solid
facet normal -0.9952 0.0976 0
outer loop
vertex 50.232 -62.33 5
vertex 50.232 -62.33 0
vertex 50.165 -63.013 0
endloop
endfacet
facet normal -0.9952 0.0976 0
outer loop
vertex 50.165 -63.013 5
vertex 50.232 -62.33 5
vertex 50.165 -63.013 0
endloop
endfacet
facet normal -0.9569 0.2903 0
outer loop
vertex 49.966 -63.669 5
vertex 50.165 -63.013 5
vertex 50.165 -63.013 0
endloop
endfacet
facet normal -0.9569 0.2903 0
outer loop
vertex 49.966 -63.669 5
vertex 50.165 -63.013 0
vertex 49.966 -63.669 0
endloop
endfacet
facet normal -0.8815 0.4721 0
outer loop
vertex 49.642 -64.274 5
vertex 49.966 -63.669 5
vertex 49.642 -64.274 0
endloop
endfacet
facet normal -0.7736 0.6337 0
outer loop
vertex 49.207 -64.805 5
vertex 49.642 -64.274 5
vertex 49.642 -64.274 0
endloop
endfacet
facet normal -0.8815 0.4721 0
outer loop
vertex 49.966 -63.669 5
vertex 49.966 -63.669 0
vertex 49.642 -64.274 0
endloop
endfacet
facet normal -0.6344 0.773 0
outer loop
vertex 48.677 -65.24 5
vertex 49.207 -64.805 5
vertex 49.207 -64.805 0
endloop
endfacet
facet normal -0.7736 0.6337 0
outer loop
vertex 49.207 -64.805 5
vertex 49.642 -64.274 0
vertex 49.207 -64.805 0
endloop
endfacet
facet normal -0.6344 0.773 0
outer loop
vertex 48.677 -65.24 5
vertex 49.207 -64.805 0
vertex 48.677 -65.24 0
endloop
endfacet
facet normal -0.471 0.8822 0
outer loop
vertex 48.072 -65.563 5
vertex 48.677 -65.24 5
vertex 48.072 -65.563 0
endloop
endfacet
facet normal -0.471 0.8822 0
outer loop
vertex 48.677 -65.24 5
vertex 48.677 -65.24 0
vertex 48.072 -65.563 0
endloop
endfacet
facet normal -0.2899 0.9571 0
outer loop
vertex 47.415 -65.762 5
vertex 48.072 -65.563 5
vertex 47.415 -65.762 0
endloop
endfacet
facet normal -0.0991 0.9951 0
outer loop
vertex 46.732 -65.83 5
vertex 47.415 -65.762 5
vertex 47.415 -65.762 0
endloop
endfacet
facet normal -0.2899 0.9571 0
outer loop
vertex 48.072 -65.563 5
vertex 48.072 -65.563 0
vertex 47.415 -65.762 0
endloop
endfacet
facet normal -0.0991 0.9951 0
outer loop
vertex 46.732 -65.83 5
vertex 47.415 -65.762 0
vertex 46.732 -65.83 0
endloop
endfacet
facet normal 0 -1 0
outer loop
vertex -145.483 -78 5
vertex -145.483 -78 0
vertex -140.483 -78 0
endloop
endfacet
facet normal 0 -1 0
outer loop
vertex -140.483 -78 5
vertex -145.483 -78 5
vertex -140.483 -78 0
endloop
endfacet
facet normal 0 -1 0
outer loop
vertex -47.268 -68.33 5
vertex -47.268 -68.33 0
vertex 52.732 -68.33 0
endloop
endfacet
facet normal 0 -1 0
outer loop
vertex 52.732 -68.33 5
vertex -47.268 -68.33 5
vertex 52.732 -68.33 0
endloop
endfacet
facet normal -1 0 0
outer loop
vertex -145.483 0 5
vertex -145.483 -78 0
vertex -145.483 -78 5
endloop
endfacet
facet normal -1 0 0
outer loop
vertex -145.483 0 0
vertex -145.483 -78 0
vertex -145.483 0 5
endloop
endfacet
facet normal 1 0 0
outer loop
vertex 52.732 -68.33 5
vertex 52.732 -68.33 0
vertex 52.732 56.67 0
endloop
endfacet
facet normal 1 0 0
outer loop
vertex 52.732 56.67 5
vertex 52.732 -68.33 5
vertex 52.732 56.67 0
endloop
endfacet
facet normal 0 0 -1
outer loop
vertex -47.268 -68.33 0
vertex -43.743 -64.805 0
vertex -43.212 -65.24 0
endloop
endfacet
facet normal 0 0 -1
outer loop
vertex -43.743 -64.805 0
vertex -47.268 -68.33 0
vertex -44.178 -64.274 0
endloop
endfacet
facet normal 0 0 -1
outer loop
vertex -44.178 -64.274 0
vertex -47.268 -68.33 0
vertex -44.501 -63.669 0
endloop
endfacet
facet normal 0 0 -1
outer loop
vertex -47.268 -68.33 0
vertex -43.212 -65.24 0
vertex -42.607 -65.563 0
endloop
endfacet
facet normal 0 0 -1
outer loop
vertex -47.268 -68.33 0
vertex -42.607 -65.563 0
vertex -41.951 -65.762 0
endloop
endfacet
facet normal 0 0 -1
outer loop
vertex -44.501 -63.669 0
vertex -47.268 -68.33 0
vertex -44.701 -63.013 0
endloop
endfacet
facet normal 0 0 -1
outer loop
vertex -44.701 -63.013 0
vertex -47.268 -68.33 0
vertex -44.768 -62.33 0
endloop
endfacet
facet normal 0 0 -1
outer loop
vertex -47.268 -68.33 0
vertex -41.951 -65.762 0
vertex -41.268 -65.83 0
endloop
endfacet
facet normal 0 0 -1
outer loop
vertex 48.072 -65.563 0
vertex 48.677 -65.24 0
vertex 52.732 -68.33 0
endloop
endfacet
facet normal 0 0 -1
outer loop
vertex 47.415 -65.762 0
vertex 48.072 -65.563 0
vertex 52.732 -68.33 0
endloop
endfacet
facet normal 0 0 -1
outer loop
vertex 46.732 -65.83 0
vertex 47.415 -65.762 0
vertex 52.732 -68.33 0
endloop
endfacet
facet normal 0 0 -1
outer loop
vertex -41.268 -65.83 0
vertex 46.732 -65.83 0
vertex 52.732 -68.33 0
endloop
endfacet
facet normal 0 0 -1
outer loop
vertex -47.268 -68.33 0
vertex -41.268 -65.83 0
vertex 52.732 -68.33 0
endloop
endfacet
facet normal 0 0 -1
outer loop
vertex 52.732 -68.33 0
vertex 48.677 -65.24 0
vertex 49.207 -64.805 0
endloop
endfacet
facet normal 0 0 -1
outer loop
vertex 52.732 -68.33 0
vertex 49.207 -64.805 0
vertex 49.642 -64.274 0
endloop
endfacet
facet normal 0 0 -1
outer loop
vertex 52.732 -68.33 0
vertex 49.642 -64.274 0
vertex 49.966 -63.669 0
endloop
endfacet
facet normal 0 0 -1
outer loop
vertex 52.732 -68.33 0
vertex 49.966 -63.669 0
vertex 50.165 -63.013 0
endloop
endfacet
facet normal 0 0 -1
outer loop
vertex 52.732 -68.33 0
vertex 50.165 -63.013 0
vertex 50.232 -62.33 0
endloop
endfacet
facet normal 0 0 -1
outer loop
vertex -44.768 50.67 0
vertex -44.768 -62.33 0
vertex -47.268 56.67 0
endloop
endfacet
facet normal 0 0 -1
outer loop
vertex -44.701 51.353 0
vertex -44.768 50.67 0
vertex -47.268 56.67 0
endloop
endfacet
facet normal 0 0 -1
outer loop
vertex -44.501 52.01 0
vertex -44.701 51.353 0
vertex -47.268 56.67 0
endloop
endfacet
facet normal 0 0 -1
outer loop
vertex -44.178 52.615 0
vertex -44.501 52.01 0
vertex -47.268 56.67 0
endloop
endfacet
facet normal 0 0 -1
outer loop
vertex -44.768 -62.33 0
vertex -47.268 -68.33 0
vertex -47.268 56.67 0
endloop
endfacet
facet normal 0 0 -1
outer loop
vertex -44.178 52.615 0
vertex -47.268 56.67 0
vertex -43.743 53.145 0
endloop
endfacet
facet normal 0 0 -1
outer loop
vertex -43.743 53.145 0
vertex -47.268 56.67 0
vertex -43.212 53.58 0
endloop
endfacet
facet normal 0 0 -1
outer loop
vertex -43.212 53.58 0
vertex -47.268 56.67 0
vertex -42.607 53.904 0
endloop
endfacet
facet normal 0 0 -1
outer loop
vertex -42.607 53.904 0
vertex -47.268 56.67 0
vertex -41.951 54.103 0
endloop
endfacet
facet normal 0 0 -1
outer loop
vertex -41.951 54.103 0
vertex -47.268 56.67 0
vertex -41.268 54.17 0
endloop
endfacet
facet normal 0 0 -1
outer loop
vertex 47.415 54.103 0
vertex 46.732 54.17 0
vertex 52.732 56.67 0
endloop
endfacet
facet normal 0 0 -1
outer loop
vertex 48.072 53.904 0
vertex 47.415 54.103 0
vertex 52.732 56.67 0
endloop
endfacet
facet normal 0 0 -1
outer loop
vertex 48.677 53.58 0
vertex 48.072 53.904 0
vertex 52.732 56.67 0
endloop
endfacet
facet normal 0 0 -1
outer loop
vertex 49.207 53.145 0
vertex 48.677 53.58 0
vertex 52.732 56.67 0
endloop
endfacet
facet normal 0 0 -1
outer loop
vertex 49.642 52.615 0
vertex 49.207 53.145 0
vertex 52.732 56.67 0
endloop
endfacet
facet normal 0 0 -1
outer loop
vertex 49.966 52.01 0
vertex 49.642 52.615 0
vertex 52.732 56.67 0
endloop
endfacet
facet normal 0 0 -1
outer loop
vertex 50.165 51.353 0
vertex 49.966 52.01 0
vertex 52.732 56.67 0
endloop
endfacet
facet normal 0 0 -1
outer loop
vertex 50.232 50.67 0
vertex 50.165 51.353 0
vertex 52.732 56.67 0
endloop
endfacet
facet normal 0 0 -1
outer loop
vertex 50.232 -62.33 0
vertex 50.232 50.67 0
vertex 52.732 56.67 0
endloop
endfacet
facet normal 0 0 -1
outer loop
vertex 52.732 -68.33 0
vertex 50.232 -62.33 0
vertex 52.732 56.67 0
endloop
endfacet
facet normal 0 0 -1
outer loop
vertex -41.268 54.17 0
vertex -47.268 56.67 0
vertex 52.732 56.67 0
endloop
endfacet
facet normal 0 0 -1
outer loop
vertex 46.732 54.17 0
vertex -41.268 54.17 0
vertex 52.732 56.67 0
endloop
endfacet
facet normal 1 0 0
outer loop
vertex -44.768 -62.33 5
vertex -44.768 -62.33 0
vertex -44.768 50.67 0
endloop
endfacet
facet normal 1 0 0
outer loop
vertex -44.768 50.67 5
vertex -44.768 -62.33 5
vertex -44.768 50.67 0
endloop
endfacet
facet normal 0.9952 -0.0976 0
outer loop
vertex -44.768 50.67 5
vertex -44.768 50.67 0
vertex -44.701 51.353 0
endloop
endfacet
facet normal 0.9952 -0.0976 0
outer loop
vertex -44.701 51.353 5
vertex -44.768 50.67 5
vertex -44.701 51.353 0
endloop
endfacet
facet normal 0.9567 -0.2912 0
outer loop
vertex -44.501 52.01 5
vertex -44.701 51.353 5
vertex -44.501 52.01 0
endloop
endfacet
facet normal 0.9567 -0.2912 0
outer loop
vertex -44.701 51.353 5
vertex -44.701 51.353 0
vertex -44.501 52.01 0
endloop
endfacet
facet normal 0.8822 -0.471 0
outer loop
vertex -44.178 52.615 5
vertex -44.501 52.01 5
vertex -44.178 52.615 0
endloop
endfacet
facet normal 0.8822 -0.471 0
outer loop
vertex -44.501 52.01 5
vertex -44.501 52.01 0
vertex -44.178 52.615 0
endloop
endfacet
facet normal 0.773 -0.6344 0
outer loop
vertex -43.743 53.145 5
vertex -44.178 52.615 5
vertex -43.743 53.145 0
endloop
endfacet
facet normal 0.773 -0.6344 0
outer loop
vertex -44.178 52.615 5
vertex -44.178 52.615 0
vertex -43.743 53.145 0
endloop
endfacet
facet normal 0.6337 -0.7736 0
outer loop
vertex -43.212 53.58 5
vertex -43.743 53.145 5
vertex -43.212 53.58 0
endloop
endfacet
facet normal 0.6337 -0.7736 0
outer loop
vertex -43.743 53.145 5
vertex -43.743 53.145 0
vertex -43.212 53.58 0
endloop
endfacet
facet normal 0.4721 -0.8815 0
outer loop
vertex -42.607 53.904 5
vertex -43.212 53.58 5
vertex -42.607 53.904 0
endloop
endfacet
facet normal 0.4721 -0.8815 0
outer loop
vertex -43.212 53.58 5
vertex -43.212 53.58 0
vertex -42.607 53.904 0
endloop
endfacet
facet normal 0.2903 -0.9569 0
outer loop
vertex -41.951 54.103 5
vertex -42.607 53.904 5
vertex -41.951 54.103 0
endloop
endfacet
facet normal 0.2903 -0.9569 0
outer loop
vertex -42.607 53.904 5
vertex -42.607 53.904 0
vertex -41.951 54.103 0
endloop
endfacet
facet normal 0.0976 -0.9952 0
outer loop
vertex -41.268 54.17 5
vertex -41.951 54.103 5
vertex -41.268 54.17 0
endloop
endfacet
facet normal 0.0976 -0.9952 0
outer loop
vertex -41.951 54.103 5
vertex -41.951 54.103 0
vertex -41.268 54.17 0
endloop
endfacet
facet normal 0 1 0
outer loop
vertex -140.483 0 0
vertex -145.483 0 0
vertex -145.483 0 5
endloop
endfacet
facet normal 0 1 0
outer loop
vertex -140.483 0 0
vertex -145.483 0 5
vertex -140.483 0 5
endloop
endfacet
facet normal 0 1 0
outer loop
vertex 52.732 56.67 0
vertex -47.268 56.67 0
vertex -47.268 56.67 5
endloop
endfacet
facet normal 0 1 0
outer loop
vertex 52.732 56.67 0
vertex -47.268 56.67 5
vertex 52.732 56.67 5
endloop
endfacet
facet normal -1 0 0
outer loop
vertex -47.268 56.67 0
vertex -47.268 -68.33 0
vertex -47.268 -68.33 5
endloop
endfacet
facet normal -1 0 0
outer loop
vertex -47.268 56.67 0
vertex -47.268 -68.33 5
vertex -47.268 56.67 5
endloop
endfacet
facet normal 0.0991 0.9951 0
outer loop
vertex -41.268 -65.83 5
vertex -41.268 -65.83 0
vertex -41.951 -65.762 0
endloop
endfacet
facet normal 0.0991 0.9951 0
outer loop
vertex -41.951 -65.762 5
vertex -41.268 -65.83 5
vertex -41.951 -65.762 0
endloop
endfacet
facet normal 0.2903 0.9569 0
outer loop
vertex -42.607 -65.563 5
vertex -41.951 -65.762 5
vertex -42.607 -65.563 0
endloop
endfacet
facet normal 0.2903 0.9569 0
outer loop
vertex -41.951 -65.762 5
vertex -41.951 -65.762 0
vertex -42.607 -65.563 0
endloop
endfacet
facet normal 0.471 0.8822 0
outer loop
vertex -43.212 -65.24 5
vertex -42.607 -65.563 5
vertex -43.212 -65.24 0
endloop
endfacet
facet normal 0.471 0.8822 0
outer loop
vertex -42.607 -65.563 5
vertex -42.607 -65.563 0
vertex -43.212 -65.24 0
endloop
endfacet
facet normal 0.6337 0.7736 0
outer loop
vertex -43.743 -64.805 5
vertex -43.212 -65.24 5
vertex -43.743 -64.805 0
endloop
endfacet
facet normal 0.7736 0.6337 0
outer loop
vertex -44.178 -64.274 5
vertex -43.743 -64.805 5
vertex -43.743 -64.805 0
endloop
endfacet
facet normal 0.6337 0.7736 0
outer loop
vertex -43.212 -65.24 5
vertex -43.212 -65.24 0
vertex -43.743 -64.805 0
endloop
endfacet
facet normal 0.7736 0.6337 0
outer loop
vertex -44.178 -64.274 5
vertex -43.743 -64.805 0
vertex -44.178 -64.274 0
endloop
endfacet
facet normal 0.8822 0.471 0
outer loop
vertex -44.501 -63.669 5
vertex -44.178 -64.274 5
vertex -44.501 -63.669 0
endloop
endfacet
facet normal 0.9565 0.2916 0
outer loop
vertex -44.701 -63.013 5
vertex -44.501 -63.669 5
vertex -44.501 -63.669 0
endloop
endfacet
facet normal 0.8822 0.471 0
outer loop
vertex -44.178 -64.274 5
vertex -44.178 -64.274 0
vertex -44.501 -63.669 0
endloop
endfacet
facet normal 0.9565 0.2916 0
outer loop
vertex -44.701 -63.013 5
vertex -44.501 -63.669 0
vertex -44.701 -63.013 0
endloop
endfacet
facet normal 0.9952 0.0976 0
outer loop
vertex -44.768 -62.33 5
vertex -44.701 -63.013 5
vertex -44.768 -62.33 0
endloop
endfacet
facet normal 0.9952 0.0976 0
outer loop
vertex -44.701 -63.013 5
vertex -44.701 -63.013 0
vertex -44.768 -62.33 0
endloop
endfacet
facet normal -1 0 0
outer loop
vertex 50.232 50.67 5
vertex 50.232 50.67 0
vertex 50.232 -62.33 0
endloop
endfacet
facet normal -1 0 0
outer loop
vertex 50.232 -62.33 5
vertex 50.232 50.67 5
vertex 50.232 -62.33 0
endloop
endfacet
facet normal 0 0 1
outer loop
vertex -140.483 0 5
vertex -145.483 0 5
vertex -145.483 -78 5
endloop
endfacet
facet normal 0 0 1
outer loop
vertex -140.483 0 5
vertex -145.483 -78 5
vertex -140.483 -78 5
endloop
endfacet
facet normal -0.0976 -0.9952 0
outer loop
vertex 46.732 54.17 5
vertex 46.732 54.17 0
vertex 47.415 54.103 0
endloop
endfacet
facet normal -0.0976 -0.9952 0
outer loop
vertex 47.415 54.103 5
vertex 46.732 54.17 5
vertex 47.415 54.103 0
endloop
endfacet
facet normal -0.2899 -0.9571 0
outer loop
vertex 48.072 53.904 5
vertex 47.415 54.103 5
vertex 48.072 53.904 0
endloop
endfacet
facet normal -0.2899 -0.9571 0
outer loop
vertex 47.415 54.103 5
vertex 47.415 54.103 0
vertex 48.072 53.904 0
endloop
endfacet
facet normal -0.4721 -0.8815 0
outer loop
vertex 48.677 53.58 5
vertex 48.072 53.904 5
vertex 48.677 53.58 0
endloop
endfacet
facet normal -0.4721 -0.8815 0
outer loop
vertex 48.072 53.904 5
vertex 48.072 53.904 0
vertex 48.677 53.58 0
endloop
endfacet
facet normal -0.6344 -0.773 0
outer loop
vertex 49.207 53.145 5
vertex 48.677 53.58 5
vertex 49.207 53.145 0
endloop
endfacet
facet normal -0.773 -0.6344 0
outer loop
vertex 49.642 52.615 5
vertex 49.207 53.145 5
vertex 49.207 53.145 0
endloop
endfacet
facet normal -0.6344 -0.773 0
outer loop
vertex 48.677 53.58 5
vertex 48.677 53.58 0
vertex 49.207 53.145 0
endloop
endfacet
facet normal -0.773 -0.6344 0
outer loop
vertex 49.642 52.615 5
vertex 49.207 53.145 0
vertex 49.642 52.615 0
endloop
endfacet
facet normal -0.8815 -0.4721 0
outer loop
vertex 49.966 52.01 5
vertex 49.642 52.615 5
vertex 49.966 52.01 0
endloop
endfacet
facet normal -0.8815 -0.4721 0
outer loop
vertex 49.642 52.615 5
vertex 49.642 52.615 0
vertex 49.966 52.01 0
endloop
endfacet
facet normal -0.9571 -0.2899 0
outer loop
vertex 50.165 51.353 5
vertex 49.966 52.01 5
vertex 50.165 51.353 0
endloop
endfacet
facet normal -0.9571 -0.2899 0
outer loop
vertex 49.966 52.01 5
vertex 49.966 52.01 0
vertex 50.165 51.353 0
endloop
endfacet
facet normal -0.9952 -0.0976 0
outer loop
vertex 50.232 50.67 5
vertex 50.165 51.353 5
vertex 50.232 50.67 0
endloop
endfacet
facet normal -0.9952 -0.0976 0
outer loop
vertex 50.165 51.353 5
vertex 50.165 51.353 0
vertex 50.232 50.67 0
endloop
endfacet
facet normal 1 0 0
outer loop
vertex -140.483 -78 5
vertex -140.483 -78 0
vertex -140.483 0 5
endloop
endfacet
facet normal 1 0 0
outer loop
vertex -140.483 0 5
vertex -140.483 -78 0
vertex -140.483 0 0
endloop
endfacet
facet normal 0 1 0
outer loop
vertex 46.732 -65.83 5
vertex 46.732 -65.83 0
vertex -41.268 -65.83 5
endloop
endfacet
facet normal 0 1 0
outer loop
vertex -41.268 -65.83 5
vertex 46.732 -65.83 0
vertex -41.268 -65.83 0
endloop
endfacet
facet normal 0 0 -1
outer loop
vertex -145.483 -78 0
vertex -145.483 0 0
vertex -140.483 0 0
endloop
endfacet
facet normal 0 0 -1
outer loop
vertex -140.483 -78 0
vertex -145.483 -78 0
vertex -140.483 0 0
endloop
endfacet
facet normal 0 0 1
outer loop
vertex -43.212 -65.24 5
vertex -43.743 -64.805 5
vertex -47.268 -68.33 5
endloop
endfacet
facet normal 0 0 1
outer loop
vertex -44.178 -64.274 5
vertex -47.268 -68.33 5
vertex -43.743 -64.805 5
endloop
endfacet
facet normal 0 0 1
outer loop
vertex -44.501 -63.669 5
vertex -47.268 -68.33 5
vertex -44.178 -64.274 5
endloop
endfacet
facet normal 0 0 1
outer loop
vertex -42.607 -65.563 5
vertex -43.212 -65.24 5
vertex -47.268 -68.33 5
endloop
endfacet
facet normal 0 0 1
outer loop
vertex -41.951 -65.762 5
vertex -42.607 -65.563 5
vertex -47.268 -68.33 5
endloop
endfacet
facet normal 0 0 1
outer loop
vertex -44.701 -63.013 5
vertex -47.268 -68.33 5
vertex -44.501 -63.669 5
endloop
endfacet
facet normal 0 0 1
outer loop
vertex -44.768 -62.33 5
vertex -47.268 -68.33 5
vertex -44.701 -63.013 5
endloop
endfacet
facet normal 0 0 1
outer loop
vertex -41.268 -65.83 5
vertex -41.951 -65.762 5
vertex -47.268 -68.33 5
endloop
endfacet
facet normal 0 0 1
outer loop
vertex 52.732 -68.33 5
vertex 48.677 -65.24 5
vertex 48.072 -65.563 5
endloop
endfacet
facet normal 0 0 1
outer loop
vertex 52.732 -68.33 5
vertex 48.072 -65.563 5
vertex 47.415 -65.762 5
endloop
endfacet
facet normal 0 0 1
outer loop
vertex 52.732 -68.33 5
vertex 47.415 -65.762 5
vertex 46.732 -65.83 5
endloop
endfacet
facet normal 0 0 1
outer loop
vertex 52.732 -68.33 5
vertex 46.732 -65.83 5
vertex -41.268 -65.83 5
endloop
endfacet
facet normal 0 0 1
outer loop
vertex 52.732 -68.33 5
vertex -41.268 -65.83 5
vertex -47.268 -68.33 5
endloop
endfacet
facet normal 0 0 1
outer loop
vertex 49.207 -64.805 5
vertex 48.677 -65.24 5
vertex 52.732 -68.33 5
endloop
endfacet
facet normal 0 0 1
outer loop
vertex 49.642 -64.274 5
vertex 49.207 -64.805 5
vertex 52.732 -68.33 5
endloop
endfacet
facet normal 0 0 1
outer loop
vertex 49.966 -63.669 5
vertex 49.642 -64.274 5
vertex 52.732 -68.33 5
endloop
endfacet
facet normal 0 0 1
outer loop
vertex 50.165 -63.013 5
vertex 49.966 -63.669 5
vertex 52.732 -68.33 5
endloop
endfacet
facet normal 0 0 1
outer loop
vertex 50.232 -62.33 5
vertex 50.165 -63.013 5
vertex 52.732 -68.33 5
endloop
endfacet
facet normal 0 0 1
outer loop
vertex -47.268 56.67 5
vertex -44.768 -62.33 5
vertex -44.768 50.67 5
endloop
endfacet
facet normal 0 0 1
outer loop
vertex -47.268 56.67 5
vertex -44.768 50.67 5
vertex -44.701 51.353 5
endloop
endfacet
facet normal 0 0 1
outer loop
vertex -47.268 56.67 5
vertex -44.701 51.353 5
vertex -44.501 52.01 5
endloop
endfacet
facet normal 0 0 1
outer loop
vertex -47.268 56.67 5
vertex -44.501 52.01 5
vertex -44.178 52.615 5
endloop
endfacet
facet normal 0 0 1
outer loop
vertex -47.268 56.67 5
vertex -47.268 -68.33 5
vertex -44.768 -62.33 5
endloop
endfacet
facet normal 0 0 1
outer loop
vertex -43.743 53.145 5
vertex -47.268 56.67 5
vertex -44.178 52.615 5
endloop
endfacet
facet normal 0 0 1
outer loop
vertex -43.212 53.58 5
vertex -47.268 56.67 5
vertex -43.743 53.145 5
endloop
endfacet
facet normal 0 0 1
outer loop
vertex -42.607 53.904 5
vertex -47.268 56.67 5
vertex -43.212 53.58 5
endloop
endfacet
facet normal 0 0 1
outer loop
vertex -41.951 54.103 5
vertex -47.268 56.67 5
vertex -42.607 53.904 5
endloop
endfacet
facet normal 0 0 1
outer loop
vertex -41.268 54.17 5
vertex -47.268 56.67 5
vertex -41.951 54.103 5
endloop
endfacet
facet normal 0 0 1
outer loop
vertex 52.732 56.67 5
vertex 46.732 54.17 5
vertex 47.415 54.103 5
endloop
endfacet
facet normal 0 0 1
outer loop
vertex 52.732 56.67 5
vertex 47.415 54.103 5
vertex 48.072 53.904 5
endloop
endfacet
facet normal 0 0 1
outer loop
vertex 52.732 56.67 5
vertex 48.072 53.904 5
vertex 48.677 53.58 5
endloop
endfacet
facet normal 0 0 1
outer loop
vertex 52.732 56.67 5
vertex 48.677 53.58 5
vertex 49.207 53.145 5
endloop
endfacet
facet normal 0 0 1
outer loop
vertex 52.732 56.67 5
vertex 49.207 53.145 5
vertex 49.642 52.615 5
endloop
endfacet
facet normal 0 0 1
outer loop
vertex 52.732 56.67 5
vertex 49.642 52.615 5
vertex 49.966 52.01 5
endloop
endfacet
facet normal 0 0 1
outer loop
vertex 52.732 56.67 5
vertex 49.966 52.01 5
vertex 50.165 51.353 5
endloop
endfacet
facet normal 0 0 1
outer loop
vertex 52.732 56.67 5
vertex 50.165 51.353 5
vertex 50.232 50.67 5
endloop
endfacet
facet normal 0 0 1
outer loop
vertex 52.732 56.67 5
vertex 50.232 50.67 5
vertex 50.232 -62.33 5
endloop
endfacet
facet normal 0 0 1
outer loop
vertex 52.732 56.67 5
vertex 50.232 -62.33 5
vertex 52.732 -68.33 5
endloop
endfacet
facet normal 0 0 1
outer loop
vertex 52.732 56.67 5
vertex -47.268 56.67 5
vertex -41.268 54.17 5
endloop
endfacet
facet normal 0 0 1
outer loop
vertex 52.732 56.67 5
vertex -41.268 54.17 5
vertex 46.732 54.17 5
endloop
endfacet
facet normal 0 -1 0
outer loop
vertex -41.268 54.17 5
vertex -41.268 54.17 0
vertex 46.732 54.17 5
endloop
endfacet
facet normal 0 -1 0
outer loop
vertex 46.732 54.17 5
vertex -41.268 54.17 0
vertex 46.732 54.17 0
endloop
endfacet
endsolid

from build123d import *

# Parameters (mm, degrees)
F0_W     = 100
F0_H     = 125
F1_DEPTH = 5
F0_W_2   = 5
F0_H_2   = 78


with BuildPart() as f1:
    # F0 (on Top) → F1 (new body)
    with BuildSketch(Plane.XY):
        with Locations((2.7321317747, -5.829744041)):
            Rectangle(F0_W, F0_H)
        with BuildLine():
            ThreePointArc((-44.7678682253, 50.670255959), (-43.7427419594, 53.1451296932), (-41.2678682253, 54.170255959))
            Line((-41.2678682253, 54.170255959), (46.7321317747, 54.170255959))
            ThreePointArc((46.7321317747, 54.170255959), (49.2070055089, 53.1451296932), (50.2321317747, 50.670255959))
            Line((50.2321317747, 50.670255959), (50.2321317747, -62.329744041))
            ThreePointArc((50.2321317747, -62.329744041), (49.2070055089, -64.8046177751), (46.7321317747, -65.829744041))
            Line((46.7321317747, -65.829744041), (-41.2678682253, -65.829744041))
            ThreePointArc((-41.2678682253, -65.829744041), (-43.7427419594, -64.8046177751), (-44.7678682253, -62.329744041))
            Line((-44.7678682253, -62.329744041), (-44.7678682253, 50.670255959))
        make_face(mode=Mode.SUBTRACT)
    extrude(amount=F1_DEPTH)


with BuildPart() as f1b:
    # F0 (on Top) → F1, piece 2 (new body)
    with BuildSketch(Plane.XY):
        with Locations((-142.9834938049, -39)):
            Rectangle(F0_W_2, F0_H_2)
    extrude(amount=F1_DEPTH)


solid = Compound([f1.part, f1b.part])
